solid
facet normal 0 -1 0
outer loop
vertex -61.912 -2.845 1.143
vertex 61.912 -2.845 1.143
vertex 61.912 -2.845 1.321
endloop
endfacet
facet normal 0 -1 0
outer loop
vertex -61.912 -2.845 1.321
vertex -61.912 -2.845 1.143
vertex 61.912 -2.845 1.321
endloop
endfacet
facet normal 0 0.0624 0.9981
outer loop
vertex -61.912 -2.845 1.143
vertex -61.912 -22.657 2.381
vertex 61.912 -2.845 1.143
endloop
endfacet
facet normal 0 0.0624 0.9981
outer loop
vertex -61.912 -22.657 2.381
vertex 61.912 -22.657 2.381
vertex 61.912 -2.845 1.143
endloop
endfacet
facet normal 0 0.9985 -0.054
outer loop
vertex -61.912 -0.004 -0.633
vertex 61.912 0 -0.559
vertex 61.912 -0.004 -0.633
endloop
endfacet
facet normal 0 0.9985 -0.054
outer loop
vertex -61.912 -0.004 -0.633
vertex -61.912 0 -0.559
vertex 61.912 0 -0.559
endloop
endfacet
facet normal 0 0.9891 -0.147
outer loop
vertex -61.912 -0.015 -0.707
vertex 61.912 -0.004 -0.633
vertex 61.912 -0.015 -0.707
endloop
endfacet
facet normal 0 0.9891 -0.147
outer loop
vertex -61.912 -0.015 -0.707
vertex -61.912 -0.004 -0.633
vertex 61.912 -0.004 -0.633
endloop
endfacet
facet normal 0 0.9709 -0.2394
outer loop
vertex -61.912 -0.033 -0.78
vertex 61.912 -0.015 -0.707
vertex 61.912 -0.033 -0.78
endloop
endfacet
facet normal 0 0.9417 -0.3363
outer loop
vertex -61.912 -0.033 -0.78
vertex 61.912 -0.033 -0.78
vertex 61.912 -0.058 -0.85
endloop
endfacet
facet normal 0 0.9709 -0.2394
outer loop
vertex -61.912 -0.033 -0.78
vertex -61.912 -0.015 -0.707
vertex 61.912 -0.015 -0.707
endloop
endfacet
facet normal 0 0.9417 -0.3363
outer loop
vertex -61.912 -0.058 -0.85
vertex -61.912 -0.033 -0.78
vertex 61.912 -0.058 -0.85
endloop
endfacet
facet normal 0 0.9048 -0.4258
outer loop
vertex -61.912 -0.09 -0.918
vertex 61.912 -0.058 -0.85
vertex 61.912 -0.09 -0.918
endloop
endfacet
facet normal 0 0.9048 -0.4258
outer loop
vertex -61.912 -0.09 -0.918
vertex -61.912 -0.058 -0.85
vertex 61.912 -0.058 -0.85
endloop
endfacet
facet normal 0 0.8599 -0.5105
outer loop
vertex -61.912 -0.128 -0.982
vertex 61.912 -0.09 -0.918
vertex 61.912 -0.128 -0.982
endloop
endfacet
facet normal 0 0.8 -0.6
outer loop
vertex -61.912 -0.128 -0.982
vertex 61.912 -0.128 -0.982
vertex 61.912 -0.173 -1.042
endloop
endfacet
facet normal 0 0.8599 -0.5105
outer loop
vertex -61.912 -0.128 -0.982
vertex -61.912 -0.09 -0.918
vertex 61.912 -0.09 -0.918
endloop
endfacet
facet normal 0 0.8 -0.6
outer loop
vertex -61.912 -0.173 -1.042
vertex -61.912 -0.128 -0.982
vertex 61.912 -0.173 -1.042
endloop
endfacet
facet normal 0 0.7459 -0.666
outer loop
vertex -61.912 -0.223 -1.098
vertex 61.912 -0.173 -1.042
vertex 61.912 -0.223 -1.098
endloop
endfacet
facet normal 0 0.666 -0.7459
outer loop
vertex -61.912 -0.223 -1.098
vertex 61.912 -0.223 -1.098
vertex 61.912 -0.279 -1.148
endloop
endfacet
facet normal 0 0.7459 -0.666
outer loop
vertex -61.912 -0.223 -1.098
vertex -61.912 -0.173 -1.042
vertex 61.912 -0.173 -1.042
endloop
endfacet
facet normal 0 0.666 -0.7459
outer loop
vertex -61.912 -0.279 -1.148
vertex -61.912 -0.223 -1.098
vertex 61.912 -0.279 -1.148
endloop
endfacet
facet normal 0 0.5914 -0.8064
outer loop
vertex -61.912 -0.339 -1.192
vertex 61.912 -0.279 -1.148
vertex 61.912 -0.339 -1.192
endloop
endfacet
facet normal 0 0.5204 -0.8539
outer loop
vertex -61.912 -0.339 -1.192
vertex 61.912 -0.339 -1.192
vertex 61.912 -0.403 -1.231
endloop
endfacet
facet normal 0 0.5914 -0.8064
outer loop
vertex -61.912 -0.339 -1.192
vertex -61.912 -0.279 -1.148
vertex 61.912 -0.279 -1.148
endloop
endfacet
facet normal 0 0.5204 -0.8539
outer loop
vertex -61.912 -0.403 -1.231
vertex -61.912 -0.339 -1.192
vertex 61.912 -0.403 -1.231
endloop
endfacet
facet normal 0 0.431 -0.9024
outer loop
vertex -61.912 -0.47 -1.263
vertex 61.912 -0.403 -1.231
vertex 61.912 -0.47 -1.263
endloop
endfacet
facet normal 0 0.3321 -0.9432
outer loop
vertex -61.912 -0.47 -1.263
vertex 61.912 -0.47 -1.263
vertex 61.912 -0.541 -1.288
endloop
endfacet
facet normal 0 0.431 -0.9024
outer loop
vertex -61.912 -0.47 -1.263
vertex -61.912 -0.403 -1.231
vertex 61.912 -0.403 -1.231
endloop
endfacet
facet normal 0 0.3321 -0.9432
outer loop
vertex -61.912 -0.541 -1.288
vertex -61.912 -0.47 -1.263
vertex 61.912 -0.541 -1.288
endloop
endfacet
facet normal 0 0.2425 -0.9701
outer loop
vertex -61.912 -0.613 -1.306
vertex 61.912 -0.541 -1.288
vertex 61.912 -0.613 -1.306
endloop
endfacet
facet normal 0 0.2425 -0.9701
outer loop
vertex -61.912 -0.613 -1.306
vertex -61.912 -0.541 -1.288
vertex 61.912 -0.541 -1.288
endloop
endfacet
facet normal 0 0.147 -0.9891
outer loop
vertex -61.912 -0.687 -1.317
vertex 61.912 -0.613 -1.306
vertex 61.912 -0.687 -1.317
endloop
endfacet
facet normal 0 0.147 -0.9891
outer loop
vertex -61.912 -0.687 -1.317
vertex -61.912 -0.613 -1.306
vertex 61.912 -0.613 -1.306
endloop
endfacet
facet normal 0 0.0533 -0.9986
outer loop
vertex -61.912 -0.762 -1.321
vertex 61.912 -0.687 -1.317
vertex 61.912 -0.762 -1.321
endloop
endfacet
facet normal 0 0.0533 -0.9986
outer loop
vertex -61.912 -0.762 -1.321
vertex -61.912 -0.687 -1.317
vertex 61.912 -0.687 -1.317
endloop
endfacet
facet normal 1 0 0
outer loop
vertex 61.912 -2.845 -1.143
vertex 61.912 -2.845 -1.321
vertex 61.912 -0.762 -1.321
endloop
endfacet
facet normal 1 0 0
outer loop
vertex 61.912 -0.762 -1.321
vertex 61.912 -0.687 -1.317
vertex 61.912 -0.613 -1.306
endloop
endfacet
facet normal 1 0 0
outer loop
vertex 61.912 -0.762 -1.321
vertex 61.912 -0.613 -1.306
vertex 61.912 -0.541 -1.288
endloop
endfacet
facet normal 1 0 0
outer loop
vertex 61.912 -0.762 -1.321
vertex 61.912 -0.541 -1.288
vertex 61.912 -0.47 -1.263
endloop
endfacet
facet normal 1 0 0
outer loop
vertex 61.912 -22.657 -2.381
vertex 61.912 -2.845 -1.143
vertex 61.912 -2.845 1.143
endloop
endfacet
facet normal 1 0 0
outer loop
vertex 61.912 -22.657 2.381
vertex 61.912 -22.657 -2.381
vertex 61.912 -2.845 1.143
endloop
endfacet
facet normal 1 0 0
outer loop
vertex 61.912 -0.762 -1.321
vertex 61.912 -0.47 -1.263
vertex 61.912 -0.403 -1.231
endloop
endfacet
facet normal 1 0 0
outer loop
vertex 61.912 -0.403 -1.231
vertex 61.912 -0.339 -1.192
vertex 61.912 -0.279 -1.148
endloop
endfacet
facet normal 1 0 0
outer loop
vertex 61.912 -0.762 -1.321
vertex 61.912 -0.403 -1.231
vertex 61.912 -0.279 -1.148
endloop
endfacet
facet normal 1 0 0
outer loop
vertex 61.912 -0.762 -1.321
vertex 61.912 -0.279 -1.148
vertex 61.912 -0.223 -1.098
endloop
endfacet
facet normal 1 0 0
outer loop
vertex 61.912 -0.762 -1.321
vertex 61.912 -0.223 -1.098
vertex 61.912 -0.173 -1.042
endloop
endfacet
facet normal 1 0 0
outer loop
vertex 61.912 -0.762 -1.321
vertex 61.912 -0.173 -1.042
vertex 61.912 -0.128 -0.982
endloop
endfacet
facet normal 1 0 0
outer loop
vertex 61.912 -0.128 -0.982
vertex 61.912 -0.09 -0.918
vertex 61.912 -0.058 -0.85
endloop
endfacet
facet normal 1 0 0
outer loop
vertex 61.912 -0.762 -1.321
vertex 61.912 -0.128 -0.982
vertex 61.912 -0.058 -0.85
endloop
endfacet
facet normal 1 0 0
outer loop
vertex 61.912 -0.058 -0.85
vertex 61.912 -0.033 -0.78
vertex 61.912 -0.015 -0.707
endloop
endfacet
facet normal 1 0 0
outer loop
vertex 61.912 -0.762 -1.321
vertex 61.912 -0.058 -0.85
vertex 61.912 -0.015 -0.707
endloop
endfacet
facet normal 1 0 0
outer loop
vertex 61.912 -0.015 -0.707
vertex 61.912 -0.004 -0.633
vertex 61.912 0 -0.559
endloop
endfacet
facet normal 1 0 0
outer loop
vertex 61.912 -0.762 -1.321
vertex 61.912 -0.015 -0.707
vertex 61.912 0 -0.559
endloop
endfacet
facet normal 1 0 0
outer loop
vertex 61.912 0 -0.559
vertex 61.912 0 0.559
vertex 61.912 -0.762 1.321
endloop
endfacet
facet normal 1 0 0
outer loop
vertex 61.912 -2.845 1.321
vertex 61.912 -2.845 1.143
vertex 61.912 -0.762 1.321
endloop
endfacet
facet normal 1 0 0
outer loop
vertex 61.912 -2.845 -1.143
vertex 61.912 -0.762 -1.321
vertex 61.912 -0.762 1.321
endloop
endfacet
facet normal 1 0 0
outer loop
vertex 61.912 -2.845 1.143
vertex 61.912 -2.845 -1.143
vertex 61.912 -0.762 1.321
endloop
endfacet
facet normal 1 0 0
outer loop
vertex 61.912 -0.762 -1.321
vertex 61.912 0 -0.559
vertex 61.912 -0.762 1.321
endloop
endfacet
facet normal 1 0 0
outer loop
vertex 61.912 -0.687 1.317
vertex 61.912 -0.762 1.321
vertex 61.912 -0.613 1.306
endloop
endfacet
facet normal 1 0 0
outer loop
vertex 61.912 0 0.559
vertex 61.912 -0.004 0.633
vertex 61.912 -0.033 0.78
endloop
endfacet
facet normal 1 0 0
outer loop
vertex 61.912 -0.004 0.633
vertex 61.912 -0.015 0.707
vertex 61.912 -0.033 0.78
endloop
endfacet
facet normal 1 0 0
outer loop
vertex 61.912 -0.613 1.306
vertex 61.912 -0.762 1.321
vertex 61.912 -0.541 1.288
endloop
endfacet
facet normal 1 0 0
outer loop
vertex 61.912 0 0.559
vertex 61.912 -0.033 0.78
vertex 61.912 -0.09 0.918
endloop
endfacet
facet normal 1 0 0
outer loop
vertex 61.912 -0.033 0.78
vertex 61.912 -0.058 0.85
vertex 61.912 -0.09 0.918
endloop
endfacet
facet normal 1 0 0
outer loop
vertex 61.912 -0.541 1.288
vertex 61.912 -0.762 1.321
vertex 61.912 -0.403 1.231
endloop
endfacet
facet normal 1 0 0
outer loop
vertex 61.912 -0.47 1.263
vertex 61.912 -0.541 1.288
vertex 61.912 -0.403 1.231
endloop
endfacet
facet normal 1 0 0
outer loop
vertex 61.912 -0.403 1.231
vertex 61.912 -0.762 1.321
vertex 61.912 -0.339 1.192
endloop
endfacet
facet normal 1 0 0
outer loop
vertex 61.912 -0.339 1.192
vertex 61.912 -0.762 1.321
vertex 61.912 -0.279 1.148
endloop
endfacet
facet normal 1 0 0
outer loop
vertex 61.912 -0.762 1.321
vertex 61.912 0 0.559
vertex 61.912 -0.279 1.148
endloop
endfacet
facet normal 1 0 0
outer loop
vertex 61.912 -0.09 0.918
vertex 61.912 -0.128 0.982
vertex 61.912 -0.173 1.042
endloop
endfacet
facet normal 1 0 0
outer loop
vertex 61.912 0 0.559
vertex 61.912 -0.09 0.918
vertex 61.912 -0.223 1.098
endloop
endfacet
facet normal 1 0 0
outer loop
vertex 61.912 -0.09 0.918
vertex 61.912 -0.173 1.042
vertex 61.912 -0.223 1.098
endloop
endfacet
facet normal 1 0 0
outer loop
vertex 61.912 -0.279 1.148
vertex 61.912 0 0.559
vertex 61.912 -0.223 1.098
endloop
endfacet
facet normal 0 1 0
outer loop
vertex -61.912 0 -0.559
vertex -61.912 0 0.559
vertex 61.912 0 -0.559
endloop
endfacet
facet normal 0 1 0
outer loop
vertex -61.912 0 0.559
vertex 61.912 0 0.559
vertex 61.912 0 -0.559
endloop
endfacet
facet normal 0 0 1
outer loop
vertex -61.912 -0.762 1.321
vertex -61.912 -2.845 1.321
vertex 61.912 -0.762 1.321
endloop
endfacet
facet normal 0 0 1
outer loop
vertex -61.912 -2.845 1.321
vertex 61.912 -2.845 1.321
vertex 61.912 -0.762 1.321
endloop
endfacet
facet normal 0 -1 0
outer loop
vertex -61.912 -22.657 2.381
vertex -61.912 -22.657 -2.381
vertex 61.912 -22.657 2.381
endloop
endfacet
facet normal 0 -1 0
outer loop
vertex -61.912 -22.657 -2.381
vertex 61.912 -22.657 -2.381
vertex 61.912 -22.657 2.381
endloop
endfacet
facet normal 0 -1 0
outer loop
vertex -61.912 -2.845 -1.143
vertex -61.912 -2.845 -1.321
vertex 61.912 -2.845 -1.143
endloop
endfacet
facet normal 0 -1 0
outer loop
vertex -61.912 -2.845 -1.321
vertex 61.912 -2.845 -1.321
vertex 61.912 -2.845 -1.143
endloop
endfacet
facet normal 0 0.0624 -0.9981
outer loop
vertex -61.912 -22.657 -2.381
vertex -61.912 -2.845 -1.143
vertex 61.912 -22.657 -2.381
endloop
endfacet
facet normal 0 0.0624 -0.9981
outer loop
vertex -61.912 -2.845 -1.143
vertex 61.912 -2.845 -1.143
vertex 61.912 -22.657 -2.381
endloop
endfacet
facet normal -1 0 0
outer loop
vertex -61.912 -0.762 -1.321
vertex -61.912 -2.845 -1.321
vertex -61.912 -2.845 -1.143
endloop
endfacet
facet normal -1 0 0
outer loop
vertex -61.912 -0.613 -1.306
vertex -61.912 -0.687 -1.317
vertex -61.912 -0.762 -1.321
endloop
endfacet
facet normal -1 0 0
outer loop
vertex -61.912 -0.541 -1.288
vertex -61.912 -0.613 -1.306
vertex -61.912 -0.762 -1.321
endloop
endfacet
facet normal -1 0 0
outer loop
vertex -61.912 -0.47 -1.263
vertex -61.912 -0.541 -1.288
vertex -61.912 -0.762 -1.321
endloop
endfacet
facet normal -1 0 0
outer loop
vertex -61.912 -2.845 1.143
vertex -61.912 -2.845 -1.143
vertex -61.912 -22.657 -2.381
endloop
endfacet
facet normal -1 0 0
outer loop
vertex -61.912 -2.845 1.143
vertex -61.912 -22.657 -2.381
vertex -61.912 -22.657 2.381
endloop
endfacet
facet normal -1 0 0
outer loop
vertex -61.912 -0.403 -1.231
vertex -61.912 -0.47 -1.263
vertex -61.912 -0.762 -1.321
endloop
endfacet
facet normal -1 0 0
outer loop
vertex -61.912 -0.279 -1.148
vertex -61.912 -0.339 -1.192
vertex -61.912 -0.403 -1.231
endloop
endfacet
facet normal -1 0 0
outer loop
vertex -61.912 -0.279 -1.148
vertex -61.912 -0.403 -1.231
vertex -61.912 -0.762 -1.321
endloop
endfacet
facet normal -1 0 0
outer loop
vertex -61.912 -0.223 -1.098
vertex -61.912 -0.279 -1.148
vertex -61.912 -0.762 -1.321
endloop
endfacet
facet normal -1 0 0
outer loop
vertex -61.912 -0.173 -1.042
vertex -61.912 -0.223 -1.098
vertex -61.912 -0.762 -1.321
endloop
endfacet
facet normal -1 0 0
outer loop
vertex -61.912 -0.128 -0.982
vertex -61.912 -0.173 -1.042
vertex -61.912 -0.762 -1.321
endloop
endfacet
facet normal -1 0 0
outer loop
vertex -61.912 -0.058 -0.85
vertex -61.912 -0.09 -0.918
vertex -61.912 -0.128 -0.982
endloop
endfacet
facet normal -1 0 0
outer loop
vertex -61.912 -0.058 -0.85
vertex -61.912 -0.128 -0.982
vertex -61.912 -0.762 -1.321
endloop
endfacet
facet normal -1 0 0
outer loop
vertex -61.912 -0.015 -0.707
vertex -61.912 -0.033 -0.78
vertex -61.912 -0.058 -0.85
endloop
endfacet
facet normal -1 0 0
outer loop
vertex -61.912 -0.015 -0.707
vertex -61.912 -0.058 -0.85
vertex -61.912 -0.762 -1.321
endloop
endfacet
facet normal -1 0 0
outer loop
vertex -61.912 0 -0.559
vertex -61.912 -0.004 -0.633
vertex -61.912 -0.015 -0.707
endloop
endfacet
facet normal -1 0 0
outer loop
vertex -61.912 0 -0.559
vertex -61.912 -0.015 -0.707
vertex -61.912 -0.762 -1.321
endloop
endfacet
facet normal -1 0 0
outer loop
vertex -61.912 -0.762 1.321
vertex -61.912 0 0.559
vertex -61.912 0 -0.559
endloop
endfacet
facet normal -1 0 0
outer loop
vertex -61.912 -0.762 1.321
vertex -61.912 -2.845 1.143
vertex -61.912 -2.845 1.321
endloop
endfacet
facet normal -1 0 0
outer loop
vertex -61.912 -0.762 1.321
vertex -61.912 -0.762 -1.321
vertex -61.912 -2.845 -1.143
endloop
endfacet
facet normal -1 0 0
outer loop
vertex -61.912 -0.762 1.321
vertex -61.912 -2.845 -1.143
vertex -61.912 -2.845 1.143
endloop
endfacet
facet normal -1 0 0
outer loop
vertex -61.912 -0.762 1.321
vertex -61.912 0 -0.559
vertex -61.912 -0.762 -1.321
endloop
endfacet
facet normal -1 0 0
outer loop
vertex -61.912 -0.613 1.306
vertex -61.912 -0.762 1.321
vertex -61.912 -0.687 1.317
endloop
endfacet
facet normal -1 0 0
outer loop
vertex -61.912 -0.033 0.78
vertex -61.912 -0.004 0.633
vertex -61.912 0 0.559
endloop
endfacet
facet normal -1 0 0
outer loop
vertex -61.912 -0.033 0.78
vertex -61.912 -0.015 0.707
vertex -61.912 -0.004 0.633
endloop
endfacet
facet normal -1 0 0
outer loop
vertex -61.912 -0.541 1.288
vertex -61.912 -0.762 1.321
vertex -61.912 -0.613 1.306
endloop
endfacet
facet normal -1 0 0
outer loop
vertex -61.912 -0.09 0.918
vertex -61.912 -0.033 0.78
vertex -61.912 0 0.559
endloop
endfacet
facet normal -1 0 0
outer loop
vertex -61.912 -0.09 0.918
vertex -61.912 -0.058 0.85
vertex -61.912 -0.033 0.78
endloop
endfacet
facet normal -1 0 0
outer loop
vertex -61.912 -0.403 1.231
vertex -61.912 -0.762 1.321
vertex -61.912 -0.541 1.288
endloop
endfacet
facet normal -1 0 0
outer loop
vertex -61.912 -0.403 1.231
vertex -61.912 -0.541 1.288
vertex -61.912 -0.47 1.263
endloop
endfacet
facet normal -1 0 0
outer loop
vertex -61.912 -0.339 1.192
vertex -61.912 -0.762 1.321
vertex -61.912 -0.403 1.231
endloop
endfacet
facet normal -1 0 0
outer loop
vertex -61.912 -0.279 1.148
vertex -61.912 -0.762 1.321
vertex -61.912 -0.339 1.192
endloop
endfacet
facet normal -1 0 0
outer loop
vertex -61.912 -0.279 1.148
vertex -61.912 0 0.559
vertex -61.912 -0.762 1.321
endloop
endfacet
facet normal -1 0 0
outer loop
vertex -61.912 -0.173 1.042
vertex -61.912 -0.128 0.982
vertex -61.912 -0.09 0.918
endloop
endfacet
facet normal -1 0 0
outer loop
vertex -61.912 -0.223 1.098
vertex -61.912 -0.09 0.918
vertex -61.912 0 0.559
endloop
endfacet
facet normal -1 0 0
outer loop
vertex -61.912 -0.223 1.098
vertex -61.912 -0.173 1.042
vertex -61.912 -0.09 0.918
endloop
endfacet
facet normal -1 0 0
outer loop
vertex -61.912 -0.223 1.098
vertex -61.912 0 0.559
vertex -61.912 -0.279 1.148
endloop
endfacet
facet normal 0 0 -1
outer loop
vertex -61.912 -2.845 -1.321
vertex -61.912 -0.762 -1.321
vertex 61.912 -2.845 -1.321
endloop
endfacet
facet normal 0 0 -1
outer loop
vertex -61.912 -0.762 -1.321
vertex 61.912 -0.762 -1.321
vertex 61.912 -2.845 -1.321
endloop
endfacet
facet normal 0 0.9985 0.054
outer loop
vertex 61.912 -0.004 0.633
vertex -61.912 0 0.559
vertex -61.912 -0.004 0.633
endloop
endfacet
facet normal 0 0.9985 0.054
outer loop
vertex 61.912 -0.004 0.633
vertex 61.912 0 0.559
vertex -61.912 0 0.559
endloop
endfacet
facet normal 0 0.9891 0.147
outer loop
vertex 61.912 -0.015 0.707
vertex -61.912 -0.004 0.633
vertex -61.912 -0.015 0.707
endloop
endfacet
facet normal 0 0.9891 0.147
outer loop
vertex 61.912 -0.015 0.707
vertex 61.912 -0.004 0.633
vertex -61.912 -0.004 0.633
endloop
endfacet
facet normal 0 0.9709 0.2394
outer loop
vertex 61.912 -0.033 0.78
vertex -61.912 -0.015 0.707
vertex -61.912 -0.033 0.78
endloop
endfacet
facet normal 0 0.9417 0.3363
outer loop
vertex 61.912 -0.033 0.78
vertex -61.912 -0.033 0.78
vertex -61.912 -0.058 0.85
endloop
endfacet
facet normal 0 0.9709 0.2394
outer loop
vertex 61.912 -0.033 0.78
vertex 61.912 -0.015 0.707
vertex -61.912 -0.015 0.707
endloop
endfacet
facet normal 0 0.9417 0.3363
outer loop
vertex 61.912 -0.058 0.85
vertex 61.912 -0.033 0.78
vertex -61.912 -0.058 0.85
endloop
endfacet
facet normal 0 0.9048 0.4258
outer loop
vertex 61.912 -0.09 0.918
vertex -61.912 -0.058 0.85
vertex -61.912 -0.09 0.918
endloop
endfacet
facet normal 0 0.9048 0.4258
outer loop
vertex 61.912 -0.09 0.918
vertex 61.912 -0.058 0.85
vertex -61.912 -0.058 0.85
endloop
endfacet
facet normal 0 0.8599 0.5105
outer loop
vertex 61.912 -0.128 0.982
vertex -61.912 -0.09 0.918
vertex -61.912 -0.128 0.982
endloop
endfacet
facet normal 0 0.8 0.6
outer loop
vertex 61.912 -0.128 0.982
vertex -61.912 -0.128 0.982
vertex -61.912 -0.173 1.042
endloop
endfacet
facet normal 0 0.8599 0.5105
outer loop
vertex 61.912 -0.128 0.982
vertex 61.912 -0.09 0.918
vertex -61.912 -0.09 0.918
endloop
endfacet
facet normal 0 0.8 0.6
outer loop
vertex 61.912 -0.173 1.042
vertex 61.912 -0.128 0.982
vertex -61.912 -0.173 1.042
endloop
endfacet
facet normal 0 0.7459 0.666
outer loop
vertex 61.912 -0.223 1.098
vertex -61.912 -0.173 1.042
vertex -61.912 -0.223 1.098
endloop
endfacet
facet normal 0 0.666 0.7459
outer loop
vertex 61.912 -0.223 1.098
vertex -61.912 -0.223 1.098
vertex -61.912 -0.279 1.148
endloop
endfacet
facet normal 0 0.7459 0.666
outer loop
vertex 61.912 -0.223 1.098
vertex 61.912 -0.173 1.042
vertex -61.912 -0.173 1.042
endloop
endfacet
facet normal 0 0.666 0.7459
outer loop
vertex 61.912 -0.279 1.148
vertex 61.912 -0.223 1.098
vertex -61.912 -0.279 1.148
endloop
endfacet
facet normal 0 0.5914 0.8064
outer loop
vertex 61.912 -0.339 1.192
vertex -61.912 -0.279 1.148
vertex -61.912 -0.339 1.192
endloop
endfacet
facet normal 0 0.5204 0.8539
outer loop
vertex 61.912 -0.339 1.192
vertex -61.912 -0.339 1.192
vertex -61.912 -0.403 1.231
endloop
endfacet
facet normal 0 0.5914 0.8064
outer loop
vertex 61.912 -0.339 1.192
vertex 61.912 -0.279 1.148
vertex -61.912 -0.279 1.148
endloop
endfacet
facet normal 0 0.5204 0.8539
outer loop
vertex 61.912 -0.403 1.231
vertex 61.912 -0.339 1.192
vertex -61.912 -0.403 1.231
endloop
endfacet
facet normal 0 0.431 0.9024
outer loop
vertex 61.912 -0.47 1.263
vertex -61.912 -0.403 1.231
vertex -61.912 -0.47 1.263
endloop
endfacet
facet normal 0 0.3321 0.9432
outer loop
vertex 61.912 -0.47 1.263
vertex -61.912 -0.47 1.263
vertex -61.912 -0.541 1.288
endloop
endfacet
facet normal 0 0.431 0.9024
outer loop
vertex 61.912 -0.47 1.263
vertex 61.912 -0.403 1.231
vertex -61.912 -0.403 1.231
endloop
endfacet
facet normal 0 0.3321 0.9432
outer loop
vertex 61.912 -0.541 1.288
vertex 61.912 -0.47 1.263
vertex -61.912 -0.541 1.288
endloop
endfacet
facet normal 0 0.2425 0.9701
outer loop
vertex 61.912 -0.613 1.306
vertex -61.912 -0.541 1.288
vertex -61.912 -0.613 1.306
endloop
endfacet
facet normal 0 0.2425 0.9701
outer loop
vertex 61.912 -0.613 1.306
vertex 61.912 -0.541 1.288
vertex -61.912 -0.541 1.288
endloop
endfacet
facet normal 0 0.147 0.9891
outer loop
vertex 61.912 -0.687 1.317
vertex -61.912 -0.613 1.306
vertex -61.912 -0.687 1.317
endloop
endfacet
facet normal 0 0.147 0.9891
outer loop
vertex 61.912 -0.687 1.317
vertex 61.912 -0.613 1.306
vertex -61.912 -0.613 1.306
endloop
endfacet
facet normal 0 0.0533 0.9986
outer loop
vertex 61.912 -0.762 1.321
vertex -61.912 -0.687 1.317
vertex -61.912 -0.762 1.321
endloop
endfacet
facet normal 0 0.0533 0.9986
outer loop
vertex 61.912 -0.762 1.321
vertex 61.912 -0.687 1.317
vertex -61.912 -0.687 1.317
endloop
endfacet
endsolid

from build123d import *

# Parameters (mm, degrees)
BOSS_EXTRUDE1_DEPTH = 61.9125
FILLET1_R           = 0.762


with BuildPart() as part:
    # Sketch1 → Boss-Extrude1 (new body, symmetric)
    with BuildSketch(Plane(origin=(0, 0, 0), x_dir=(0, 0, -1), z_dir=(1, 0, 0))):
        Polygon((-1.3208, 0), (1.3208, 0), (1.3208, -2.8448), (1.143, -2.8448), (2.38125, -22.6568), (-2.38125, -22.6568), (-1.143, -2.8448), (-1.3208, -2.8448), align=None)
    extrude(amount=BOSS_EXTRUDE1_DEPTH, both=True)

    # Fillet1
    fillet1_edges = [part.edges().sort_by_distance(p)[0] for p in [
        (0, 0, 1.3208),
        (0, 0, -1.3208),
    ]]
    fillet(fillet1_edges, radius=FILLET1_R)


solid = part.part
